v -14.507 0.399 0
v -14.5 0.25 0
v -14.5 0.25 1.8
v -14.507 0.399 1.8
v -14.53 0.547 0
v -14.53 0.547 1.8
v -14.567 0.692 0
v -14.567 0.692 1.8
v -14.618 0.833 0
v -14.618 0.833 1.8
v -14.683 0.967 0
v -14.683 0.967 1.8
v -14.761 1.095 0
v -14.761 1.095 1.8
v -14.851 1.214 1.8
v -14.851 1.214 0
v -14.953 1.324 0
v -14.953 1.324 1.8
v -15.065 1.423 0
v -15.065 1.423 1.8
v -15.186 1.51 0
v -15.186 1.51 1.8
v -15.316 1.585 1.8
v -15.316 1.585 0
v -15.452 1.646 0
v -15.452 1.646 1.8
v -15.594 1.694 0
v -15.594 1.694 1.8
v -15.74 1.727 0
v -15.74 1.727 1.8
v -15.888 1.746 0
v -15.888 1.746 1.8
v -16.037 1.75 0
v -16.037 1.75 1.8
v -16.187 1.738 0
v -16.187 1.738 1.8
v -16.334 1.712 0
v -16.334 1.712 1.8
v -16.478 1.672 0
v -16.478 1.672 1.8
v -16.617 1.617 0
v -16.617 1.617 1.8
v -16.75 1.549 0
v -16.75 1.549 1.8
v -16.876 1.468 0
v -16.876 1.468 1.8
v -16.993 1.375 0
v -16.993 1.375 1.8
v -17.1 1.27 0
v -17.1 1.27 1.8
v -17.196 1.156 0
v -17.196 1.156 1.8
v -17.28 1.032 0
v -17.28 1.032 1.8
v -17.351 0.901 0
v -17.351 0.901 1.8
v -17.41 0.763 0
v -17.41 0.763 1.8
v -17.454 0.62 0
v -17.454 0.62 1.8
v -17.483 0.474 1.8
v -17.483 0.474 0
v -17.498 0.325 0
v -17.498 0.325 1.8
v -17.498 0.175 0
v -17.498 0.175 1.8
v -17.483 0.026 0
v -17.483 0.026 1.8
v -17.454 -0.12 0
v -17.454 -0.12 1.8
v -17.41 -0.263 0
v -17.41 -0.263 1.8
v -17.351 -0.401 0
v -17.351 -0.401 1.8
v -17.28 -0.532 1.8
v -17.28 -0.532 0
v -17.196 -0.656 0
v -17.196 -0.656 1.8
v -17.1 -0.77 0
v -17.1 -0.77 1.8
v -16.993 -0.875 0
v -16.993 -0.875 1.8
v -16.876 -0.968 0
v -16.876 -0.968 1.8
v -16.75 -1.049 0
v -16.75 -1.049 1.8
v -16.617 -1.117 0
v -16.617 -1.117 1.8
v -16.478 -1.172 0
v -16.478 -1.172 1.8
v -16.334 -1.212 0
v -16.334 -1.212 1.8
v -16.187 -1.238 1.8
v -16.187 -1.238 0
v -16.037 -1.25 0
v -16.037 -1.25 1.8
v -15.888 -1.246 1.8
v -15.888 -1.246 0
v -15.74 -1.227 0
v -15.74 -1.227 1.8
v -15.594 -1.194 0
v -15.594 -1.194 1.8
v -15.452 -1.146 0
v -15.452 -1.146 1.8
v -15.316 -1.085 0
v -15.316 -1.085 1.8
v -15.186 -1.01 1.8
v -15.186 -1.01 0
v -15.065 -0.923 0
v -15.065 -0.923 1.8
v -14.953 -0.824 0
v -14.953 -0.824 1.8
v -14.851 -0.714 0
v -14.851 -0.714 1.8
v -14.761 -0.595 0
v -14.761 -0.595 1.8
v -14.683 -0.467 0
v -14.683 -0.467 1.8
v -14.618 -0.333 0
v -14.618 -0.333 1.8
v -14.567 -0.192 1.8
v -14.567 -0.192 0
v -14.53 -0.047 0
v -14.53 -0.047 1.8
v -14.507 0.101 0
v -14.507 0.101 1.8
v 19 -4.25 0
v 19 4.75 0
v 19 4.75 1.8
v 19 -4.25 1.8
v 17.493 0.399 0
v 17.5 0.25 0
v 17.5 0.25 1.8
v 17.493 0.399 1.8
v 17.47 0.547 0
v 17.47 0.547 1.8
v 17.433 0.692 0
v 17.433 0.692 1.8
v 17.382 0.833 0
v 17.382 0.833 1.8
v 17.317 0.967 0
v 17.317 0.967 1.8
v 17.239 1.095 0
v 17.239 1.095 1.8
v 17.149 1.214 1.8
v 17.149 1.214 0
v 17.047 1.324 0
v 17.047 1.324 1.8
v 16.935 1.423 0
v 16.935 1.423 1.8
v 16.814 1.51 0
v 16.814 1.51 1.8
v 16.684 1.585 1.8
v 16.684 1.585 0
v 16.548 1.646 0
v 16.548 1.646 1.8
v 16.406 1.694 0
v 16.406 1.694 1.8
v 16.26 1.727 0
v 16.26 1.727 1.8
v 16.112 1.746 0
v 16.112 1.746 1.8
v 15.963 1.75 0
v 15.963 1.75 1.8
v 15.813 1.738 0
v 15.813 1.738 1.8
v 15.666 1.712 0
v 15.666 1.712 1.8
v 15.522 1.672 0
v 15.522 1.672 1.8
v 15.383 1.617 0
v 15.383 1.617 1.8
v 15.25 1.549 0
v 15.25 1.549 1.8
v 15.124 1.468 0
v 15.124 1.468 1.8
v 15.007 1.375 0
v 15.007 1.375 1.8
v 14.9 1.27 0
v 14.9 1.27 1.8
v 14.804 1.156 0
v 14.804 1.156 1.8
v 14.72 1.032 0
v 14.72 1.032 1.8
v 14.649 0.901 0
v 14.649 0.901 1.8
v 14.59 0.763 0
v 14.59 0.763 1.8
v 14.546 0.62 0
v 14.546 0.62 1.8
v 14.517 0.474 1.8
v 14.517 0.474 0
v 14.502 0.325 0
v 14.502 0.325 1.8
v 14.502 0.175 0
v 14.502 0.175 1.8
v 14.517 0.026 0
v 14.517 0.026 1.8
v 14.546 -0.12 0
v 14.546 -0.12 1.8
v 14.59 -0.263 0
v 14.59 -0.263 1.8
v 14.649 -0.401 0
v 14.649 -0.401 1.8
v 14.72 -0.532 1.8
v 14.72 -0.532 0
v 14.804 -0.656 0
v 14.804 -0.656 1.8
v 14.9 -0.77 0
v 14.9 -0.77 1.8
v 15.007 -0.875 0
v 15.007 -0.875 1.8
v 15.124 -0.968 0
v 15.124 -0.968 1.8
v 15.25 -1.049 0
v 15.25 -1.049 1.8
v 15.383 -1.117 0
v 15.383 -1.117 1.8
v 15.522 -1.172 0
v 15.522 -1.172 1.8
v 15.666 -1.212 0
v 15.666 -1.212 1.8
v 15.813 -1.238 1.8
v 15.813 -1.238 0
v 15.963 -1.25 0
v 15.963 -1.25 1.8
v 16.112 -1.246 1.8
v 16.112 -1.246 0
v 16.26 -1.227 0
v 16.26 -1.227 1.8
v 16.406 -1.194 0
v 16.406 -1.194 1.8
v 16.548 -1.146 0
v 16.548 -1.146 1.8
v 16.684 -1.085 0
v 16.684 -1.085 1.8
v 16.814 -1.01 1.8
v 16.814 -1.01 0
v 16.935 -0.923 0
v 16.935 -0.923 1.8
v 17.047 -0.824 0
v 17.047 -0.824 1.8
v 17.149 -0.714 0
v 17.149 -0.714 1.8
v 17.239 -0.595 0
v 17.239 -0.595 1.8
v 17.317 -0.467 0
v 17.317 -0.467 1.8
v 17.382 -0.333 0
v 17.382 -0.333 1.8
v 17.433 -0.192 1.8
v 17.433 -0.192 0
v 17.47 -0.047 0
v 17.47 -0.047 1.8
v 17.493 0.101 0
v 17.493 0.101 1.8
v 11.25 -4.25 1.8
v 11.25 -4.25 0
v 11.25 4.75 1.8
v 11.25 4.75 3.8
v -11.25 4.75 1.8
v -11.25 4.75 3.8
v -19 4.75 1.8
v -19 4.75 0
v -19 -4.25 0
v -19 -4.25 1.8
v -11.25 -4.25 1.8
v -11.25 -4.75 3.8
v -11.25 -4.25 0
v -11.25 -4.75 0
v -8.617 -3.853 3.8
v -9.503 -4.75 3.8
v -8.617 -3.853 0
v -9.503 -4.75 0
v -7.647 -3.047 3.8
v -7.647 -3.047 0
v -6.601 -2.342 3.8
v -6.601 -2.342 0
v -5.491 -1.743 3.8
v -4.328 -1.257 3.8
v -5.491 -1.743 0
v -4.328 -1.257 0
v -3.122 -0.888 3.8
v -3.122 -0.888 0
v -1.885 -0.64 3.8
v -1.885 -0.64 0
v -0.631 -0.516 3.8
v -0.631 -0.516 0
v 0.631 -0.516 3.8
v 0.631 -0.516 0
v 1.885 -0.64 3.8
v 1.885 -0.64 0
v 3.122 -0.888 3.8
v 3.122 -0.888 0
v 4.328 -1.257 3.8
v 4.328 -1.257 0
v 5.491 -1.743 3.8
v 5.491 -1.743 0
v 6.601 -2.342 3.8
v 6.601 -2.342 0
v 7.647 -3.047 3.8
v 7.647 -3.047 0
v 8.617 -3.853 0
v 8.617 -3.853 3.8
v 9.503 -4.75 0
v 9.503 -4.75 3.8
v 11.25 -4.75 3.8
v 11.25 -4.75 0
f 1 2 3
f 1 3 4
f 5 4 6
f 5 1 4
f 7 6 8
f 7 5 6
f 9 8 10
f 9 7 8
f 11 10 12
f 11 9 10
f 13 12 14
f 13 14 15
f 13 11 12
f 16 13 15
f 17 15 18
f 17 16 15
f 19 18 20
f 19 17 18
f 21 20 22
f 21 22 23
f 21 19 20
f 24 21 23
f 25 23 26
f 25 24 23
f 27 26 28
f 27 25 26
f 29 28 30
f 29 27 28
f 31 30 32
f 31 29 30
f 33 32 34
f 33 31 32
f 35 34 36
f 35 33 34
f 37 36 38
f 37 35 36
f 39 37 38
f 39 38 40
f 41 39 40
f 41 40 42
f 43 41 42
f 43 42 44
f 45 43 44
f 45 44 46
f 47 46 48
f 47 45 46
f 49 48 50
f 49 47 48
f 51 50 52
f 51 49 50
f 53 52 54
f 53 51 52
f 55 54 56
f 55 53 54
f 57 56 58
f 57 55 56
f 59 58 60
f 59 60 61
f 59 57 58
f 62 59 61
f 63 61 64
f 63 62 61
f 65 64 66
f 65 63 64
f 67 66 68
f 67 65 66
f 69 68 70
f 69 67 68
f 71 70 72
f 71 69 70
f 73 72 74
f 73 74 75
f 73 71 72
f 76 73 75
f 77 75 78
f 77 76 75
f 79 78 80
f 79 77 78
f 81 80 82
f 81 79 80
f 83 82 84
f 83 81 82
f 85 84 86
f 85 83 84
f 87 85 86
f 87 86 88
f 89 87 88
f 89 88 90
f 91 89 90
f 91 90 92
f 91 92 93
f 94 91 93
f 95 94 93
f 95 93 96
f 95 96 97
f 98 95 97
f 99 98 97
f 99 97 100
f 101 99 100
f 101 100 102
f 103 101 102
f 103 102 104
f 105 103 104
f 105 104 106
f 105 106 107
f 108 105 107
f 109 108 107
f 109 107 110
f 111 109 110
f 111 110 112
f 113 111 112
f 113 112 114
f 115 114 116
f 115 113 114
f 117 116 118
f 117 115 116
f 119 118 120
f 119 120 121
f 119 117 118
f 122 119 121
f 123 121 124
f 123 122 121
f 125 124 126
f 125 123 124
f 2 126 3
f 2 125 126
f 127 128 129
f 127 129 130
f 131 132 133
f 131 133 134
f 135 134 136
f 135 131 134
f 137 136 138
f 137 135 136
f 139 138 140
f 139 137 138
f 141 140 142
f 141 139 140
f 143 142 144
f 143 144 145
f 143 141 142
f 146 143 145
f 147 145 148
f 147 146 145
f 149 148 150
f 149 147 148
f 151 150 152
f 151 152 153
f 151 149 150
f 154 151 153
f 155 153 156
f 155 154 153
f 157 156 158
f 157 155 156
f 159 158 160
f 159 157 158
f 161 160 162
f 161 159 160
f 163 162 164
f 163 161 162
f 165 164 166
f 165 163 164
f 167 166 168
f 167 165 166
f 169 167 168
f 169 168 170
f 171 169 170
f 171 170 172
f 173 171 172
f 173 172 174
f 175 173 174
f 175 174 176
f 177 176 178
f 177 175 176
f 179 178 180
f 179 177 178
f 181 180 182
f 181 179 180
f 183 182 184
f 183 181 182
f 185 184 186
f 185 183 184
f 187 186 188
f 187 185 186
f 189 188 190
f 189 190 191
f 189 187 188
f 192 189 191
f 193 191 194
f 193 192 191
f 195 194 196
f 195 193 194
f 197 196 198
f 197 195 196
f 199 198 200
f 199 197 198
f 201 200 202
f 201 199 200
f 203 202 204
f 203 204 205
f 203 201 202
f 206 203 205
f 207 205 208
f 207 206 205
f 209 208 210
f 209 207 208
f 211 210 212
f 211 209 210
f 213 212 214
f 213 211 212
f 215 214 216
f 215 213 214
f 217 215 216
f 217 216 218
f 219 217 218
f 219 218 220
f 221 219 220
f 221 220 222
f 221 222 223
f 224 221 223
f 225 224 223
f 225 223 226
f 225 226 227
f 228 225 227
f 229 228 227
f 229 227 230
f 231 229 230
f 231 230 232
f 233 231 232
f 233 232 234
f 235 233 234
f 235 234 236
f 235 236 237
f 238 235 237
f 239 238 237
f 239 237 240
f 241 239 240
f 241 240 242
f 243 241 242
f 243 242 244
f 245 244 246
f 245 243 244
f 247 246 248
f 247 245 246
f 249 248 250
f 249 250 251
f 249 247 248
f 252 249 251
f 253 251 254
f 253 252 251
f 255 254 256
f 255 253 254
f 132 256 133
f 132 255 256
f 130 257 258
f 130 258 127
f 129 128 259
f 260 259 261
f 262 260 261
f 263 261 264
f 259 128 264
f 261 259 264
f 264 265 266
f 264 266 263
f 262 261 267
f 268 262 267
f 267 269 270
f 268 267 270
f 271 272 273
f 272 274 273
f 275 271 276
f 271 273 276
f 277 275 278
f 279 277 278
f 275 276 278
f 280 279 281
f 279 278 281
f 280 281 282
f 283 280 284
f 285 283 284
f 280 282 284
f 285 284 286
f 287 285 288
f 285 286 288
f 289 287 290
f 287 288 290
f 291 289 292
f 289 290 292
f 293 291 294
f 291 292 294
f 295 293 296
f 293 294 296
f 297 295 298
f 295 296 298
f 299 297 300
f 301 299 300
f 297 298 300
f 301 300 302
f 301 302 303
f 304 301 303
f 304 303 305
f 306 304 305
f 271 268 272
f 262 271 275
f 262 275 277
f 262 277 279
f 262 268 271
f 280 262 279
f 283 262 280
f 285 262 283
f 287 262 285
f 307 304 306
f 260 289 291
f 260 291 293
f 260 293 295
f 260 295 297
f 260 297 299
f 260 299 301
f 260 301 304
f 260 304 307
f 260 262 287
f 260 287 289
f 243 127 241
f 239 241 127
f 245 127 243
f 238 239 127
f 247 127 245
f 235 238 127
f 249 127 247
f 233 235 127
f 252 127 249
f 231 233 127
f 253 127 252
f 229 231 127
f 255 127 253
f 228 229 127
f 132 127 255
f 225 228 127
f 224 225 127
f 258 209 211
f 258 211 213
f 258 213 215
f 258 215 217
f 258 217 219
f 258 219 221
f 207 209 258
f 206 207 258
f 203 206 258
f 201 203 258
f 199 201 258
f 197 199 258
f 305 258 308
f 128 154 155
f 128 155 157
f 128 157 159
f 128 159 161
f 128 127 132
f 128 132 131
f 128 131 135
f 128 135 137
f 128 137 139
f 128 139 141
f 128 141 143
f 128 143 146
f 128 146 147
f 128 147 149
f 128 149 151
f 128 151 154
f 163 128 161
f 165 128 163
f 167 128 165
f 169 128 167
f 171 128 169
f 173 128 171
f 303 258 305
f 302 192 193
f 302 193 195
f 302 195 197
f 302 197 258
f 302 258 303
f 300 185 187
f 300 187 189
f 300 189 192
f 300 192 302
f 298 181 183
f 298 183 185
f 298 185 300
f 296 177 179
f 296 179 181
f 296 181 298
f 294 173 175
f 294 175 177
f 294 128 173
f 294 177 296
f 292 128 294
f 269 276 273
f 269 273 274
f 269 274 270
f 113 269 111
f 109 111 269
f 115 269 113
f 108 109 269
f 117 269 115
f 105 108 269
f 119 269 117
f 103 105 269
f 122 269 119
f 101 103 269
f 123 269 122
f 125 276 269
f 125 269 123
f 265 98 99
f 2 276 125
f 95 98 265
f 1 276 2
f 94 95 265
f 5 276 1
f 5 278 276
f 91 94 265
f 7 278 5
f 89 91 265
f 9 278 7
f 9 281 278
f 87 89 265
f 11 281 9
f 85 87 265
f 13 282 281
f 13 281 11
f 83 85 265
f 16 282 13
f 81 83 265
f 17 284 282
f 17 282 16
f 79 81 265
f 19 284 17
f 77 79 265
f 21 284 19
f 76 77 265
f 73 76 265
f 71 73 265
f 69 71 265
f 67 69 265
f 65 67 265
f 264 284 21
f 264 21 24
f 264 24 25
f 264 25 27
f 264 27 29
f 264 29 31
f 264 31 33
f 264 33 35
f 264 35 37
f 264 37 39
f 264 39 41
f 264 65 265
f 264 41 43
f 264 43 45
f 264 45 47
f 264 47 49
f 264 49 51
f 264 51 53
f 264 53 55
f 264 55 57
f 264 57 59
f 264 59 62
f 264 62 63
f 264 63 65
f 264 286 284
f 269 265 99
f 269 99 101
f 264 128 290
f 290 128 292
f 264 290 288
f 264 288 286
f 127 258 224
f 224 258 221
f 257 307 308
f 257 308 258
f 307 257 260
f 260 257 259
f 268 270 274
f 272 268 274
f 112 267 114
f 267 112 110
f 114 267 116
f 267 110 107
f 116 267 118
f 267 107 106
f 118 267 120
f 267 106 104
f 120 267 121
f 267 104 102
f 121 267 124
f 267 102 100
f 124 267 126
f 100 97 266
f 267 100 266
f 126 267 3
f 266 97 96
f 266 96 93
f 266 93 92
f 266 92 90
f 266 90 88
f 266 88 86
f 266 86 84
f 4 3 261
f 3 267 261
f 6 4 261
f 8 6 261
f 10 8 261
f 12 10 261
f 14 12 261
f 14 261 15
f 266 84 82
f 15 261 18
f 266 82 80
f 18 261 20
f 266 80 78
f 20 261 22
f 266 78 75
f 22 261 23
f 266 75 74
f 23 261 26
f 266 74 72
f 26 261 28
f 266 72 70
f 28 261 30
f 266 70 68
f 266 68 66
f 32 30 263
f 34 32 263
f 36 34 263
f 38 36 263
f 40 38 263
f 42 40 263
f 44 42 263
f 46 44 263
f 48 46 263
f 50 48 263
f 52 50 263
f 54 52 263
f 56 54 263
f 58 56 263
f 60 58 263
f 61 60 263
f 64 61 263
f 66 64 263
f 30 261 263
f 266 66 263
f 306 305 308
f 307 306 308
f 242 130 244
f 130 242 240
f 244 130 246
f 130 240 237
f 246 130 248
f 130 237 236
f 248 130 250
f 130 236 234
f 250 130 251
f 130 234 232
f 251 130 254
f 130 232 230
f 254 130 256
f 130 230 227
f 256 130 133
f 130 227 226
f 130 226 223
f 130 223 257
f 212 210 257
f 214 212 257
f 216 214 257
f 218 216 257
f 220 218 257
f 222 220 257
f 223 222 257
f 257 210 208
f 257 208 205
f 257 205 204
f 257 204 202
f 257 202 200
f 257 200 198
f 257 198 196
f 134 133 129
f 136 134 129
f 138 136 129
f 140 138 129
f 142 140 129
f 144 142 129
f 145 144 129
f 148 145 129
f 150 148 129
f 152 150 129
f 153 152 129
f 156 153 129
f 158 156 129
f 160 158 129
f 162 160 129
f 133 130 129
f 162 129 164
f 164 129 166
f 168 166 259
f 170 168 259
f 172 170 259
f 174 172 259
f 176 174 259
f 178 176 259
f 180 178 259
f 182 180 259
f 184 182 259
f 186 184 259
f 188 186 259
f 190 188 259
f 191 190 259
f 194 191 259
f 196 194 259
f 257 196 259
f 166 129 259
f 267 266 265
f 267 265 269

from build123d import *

# Parameters (mm, degrees)
SKETCH_1_R          = 1.5
EXTRUDE_1_DEPTH     = 1.8
EXTRUDE_2_DEPTH     = 2
SKETCH_3_W          = 7.75
SKETCH_3_H          = 0.5
CUT_EXTRUDE_1_DEPTH = 20.686607123


with BuildPart() as part:
    # 草图1 → 凸台-拉伸1 (new body)
    with BuildSketch(Plane.XY):
        with BuildLine():
            Line((-9.503288904, -4.75), (-19, -4.75))
            Line((-19, -4.75), (-19, 4.75))
            Line((-19, 4.75), (19, 4.75))
            Line((19, 4.75), (19, -4.75))
            Line((19, -4.75), (9.503288904, -4.75))
            ThreePointArc((9.503288904, -4.75), (0, -0.5), (-9.503288904, -4.75))
        make_face()
        with Locations((-16, 0.25)):
            Circle(SKETCH_1_R, mode=Mode.SUBTRACT)
        with Locations((16, 0.25)):
            Circle(SKETCH_1_R, mode=Mode.SUBTRACT)
    extrude(amount=EXTRUDE_1_DEPTH)

    # 草图2 → 凸台-拉伸2 (add)
    with BuildSketch(Plane.XY.offset(1.8)):
        with BuildLine():
            Line((-11.25, 4.75), (-11.25, -4.75))
            Line((-11.25, -4.75), (-9.503288904, -4.75))
            ThreePointArc((-9.503288904, -4.75), (0, -0.5), (9.503288904, -4.75))
            Line((9.503288904, -4.75), (11.25, -4.75))
            Line((11.25, -4.75), (11.25, 4.75))
            Line((11.25, 4.75), (-11.25, 4.75))
        make_face()
    extrude(amount=EXTRUDE_2_DEPTH)

    # 草图3 → 切除-拉伸1 (cut, through all)
    with BuildSketch(Plane.XY.offset(1.8)):
        with Locations((-15.125, -4.5)):
            Rectangle(SKETCH_3_W, SKETCH_3_H)
        with Locations((15.125, -4.5)):
            Rectangle(SKETCH_3_W, SKETCH_3_H)
    extrude(amount=-CUT_EXTRUDE_1_DEPTH, mode=Mode.SUBTRACT)


solid = part.part
